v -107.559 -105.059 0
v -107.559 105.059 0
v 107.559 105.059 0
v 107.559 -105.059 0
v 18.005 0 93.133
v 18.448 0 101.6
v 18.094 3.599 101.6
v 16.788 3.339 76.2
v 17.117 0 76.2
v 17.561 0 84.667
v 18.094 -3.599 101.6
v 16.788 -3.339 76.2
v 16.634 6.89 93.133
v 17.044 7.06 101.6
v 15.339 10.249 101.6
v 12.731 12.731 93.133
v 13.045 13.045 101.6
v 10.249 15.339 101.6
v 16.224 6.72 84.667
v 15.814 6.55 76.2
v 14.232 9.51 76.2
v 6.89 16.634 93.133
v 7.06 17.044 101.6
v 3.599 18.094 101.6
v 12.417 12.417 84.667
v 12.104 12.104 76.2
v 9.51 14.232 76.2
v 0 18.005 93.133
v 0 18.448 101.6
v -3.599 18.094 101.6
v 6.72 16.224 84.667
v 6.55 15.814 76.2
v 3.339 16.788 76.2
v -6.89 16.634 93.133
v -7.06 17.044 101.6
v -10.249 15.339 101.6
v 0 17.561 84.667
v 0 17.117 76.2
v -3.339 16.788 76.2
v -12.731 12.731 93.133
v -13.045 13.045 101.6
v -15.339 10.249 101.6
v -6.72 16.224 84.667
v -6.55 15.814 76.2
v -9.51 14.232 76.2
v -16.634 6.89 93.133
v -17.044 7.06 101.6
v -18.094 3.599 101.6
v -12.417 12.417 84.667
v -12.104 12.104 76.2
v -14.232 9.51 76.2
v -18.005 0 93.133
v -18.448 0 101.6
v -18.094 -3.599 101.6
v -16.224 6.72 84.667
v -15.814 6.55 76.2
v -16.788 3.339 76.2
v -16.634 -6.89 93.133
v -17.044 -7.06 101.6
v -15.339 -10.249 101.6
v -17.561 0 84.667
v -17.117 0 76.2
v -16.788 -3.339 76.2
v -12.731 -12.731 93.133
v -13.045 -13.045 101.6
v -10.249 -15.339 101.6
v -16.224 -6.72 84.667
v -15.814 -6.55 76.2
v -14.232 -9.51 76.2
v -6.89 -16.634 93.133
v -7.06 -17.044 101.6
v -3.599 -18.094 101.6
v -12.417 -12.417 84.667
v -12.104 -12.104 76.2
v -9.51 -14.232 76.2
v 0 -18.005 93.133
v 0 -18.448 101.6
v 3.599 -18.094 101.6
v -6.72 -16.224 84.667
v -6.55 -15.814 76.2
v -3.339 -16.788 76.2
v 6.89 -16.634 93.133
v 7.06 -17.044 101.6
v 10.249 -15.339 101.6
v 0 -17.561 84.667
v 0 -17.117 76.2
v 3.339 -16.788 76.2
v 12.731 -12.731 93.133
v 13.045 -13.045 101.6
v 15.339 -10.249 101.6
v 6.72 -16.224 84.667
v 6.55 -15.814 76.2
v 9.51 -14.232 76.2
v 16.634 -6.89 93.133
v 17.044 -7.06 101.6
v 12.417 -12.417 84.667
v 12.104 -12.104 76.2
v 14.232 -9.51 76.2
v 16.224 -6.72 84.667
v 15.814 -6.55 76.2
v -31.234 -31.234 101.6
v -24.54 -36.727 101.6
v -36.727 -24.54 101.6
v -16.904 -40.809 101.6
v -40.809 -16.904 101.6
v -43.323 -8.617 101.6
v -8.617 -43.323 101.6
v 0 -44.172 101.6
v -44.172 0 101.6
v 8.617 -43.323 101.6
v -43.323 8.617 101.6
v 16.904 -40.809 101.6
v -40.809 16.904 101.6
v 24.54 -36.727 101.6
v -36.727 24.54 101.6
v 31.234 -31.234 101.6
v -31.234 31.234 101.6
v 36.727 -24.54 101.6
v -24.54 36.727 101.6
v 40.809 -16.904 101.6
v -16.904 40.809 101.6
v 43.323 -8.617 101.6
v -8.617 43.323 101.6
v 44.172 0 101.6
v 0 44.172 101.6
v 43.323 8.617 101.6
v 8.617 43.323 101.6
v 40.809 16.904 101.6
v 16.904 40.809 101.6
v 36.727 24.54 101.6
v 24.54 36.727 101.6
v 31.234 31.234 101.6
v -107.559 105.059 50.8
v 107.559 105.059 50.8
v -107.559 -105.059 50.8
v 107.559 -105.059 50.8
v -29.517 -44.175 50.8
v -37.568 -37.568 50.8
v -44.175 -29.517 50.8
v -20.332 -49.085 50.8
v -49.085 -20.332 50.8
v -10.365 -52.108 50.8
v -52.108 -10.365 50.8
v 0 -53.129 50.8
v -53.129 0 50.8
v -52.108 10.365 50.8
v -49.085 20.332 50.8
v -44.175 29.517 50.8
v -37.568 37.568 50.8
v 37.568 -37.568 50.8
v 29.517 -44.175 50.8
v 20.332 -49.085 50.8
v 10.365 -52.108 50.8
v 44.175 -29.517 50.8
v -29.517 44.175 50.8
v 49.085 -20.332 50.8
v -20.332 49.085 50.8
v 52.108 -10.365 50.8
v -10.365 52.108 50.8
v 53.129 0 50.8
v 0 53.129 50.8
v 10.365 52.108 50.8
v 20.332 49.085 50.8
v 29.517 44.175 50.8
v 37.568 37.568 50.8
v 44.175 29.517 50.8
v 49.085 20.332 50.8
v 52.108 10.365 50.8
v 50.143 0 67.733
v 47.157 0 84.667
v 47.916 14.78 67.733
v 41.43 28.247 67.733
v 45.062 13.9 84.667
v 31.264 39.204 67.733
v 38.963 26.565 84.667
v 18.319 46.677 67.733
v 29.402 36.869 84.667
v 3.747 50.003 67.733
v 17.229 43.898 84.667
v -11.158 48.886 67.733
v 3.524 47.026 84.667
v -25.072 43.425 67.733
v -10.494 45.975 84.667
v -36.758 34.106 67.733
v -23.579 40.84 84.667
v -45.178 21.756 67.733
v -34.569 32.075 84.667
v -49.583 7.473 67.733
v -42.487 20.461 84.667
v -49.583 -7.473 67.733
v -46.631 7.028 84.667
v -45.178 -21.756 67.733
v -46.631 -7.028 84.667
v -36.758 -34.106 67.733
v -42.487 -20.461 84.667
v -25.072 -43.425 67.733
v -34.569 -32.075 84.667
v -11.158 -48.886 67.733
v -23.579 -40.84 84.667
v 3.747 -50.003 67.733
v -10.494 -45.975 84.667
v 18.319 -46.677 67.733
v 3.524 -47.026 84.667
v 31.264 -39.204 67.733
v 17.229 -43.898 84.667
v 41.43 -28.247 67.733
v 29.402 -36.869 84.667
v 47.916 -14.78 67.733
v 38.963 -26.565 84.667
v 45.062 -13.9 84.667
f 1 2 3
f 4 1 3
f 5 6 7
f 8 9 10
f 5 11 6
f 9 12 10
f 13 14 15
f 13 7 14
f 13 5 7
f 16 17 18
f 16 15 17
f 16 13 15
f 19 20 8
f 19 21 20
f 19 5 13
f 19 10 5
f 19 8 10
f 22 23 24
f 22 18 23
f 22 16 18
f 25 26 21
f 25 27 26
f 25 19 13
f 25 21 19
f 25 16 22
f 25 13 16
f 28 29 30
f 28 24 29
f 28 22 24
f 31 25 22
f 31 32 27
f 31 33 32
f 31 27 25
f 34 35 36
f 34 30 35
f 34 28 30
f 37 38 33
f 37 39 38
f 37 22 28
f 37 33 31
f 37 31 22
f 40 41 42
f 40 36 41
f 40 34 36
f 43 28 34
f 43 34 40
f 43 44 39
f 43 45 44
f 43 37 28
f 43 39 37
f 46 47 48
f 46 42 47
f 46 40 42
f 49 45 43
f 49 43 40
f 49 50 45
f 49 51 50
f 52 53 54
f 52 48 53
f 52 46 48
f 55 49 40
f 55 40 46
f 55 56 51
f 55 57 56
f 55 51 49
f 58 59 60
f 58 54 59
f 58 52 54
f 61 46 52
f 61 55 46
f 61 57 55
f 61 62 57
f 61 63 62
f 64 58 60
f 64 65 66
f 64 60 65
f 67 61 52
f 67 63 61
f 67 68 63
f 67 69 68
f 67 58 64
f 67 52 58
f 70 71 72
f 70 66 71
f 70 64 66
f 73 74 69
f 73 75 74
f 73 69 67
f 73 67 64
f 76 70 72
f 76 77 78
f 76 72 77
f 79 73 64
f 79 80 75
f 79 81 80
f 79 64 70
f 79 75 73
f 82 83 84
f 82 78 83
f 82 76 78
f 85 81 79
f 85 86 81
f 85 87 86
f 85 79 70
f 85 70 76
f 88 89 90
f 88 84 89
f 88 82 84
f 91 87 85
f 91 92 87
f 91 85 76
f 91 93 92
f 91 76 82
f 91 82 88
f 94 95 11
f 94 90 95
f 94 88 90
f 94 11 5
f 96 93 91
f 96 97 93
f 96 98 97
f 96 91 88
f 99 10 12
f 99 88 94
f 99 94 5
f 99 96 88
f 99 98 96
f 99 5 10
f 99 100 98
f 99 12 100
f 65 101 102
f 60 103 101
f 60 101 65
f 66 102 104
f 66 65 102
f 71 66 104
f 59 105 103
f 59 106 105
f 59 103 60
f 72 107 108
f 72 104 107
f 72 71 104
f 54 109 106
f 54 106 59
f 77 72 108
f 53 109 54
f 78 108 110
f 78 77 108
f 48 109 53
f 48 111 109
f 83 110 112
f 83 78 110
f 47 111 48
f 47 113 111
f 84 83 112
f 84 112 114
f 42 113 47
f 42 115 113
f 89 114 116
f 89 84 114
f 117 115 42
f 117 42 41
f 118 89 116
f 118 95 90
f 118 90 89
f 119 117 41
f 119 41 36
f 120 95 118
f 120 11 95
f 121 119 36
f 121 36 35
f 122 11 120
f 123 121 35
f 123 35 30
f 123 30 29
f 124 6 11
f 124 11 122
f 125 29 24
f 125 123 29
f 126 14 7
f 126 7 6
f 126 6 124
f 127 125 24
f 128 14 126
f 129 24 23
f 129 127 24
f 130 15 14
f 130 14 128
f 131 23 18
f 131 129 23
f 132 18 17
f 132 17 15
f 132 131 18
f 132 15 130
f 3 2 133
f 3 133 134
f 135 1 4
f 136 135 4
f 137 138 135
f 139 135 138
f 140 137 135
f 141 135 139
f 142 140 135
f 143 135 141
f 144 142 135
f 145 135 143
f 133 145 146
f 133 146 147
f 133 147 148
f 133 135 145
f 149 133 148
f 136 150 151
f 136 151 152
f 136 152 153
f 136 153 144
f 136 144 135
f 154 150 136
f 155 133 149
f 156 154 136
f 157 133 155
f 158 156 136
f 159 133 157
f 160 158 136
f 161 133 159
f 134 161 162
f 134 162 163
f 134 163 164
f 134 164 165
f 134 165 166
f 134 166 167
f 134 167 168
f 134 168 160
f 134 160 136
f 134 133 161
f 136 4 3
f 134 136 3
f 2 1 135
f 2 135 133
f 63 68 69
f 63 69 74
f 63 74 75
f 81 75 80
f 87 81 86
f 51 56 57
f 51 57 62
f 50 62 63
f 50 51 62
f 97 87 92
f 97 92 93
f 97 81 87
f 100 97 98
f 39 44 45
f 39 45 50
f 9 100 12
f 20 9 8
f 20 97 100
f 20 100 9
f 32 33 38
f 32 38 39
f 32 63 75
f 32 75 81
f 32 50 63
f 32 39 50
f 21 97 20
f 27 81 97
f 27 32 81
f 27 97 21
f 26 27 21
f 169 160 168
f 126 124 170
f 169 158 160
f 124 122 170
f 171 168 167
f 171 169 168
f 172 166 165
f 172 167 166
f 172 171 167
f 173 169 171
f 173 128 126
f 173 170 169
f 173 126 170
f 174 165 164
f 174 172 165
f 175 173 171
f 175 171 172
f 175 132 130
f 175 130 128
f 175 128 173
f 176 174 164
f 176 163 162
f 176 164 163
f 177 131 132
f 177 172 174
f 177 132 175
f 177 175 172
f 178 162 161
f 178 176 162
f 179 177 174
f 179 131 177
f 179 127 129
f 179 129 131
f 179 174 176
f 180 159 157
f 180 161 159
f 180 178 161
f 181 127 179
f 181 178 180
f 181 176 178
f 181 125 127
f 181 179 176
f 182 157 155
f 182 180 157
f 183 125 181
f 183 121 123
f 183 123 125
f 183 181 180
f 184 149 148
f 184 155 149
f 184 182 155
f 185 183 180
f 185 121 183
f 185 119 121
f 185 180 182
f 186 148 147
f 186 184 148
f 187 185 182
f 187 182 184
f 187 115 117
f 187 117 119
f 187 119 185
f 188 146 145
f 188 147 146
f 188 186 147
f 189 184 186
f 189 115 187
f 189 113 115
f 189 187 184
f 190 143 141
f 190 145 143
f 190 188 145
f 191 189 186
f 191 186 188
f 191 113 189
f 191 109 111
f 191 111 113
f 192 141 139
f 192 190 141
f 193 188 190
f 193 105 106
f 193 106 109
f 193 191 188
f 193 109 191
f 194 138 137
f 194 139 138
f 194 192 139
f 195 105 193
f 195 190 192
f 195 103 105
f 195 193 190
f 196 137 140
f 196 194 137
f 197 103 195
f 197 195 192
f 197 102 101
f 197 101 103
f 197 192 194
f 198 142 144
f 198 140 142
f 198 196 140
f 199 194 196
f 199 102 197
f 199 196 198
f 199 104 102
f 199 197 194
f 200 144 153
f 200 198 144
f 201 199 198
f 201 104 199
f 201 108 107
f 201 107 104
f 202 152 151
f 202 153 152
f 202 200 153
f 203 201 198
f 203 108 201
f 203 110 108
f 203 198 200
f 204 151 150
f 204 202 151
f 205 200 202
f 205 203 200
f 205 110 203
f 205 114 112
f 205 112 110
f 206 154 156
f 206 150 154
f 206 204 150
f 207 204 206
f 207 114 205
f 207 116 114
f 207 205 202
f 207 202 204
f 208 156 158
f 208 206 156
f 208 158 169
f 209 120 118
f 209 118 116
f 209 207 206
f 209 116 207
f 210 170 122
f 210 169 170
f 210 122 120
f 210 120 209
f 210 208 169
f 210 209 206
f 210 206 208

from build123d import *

# Parameters (mm, degrees)
F0_W     = 215.1181101799
F0_H     = 210.1173847914
F1_DEPTH = 50.8
F2_R     = 53.1290592744
F3_DEPTH = 50.8
F3_TAPER = 10
F5_R     = 18.4483191982
F6_DEPTH = 25.4
F6_TAPER = 3


with BuildPart() as f1:
    # F0 (on Top) → F1 (new body)
    with BuildSketch(Plane.XY):
        Rectangle(F0_W, F0_H)
    extrude(amount=F1_DEPTH)

    # F2 (on face) → F3 (join)
    with BuildSketch(Plane.XY.offset(50.8)):
        Circle(F2_R)
    extrude(amount=F3_DEPTH, taper=F3_TAPER)

    # F5 (on face) → F6 (cut)
    with BuildSketch(Plane.XY.offset(101.6)):
        Circle(F5_R)
    extrude(amount=-F6_DEPTH, taper=F6_TAPER, mode=Mode.SUBTRACT)


solid = f1.part
